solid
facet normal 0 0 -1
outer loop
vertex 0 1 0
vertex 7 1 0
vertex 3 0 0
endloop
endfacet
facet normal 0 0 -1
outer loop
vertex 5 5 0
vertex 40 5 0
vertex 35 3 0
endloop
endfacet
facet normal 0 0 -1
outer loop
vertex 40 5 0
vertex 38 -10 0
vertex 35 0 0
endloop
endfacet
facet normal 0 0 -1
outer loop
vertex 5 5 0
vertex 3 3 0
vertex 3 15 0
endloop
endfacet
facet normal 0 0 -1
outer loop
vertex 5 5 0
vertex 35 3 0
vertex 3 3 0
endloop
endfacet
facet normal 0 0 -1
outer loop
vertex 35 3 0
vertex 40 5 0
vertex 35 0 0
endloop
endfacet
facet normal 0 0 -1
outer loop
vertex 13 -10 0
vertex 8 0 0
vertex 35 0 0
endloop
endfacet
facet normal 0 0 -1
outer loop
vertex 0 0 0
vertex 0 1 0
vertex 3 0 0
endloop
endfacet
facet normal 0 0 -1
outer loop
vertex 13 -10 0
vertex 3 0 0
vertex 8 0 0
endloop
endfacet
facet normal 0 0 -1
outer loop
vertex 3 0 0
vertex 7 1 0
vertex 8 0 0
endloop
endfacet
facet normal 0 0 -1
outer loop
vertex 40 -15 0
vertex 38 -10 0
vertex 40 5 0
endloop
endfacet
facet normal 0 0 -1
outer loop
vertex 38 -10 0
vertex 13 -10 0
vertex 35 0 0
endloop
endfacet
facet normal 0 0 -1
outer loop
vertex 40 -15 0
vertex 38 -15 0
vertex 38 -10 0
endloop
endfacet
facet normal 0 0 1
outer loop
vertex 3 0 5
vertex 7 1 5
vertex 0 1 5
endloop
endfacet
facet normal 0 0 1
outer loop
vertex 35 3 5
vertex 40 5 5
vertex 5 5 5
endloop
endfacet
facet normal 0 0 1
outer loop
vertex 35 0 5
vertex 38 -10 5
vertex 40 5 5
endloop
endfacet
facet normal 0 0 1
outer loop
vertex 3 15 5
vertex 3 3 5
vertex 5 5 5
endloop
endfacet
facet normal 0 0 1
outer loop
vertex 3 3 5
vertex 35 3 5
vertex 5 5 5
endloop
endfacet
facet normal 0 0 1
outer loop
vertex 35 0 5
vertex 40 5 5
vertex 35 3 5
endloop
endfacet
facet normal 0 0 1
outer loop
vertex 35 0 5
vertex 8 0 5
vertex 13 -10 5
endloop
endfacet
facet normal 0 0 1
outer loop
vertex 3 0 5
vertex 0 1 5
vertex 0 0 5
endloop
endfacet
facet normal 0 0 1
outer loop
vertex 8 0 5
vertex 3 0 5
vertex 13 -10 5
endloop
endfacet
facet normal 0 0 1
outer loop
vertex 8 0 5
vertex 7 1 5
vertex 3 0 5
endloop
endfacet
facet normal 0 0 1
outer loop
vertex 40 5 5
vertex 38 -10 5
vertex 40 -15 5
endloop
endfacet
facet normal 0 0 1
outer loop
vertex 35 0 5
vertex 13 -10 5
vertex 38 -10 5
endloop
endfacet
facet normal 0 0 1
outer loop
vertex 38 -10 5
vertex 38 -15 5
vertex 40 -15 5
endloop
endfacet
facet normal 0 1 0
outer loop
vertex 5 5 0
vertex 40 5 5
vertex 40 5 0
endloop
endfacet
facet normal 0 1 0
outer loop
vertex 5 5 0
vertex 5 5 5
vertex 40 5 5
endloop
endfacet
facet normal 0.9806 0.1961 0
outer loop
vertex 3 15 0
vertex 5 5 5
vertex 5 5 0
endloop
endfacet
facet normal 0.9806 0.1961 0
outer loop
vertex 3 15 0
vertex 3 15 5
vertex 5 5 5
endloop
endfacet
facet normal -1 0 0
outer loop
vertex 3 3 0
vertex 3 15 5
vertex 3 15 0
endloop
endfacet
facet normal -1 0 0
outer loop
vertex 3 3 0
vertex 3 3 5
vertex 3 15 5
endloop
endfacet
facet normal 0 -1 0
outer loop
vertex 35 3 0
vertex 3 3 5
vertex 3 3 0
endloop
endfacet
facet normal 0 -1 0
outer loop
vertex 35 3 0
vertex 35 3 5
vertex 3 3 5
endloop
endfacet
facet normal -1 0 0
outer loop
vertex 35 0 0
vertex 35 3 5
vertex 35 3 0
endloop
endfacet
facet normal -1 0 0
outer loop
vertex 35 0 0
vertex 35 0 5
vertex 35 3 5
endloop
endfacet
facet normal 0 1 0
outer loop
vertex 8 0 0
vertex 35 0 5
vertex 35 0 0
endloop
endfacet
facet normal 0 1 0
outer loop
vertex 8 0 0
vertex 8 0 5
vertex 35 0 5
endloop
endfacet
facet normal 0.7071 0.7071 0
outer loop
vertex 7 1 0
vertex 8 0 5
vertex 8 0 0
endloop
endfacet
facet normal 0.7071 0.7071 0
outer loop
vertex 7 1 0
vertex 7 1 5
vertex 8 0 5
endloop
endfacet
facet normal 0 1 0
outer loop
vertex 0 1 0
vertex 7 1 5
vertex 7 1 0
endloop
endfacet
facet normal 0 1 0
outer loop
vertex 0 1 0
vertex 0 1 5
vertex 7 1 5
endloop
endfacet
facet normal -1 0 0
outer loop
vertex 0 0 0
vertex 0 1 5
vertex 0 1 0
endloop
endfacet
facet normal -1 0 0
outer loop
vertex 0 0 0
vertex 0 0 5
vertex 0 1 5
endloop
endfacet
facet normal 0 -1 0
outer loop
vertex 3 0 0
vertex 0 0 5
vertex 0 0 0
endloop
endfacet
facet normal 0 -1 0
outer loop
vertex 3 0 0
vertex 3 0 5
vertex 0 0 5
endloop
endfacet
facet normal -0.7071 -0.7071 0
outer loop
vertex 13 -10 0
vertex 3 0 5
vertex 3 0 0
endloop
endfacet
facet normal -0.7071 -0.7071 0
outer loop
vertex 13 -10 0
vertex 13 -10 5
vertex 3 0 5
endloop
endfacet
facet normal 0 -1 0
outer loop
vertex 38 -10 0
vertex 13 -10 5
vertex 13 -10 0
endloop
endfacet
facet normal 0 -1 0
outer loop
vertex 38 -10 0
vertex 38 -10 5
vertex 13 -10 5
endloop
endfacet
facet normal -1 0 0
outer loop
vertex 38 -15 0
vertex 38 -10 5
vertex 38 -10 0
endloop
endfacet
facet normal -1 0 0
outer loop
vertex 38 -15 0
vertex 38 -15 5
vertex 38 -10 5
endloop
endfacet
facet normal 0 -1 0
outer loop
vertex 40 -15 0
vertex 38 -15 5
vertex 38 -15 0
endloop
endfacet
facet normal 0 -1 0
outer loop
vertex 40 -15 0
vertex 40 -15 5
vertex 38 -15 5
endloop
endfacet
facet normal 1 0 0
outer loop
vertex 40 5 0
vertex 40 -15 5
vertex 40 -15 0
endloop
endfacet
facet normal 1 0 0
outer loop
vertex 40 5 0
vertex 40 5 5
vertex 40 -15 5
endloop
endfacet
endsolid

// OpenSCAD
linear_extrude(5)
polygon([
    [0,0],
    [0,1],
    [7,1],
    [8,0],
    [35,0],
    [35,3],
    [3,3],
    [3,15],
    [5,5],
    [40,5],
    [40,-15],
    [38,-15],
    [38,-10],
    [13,-10],
    [3,0]
]);
